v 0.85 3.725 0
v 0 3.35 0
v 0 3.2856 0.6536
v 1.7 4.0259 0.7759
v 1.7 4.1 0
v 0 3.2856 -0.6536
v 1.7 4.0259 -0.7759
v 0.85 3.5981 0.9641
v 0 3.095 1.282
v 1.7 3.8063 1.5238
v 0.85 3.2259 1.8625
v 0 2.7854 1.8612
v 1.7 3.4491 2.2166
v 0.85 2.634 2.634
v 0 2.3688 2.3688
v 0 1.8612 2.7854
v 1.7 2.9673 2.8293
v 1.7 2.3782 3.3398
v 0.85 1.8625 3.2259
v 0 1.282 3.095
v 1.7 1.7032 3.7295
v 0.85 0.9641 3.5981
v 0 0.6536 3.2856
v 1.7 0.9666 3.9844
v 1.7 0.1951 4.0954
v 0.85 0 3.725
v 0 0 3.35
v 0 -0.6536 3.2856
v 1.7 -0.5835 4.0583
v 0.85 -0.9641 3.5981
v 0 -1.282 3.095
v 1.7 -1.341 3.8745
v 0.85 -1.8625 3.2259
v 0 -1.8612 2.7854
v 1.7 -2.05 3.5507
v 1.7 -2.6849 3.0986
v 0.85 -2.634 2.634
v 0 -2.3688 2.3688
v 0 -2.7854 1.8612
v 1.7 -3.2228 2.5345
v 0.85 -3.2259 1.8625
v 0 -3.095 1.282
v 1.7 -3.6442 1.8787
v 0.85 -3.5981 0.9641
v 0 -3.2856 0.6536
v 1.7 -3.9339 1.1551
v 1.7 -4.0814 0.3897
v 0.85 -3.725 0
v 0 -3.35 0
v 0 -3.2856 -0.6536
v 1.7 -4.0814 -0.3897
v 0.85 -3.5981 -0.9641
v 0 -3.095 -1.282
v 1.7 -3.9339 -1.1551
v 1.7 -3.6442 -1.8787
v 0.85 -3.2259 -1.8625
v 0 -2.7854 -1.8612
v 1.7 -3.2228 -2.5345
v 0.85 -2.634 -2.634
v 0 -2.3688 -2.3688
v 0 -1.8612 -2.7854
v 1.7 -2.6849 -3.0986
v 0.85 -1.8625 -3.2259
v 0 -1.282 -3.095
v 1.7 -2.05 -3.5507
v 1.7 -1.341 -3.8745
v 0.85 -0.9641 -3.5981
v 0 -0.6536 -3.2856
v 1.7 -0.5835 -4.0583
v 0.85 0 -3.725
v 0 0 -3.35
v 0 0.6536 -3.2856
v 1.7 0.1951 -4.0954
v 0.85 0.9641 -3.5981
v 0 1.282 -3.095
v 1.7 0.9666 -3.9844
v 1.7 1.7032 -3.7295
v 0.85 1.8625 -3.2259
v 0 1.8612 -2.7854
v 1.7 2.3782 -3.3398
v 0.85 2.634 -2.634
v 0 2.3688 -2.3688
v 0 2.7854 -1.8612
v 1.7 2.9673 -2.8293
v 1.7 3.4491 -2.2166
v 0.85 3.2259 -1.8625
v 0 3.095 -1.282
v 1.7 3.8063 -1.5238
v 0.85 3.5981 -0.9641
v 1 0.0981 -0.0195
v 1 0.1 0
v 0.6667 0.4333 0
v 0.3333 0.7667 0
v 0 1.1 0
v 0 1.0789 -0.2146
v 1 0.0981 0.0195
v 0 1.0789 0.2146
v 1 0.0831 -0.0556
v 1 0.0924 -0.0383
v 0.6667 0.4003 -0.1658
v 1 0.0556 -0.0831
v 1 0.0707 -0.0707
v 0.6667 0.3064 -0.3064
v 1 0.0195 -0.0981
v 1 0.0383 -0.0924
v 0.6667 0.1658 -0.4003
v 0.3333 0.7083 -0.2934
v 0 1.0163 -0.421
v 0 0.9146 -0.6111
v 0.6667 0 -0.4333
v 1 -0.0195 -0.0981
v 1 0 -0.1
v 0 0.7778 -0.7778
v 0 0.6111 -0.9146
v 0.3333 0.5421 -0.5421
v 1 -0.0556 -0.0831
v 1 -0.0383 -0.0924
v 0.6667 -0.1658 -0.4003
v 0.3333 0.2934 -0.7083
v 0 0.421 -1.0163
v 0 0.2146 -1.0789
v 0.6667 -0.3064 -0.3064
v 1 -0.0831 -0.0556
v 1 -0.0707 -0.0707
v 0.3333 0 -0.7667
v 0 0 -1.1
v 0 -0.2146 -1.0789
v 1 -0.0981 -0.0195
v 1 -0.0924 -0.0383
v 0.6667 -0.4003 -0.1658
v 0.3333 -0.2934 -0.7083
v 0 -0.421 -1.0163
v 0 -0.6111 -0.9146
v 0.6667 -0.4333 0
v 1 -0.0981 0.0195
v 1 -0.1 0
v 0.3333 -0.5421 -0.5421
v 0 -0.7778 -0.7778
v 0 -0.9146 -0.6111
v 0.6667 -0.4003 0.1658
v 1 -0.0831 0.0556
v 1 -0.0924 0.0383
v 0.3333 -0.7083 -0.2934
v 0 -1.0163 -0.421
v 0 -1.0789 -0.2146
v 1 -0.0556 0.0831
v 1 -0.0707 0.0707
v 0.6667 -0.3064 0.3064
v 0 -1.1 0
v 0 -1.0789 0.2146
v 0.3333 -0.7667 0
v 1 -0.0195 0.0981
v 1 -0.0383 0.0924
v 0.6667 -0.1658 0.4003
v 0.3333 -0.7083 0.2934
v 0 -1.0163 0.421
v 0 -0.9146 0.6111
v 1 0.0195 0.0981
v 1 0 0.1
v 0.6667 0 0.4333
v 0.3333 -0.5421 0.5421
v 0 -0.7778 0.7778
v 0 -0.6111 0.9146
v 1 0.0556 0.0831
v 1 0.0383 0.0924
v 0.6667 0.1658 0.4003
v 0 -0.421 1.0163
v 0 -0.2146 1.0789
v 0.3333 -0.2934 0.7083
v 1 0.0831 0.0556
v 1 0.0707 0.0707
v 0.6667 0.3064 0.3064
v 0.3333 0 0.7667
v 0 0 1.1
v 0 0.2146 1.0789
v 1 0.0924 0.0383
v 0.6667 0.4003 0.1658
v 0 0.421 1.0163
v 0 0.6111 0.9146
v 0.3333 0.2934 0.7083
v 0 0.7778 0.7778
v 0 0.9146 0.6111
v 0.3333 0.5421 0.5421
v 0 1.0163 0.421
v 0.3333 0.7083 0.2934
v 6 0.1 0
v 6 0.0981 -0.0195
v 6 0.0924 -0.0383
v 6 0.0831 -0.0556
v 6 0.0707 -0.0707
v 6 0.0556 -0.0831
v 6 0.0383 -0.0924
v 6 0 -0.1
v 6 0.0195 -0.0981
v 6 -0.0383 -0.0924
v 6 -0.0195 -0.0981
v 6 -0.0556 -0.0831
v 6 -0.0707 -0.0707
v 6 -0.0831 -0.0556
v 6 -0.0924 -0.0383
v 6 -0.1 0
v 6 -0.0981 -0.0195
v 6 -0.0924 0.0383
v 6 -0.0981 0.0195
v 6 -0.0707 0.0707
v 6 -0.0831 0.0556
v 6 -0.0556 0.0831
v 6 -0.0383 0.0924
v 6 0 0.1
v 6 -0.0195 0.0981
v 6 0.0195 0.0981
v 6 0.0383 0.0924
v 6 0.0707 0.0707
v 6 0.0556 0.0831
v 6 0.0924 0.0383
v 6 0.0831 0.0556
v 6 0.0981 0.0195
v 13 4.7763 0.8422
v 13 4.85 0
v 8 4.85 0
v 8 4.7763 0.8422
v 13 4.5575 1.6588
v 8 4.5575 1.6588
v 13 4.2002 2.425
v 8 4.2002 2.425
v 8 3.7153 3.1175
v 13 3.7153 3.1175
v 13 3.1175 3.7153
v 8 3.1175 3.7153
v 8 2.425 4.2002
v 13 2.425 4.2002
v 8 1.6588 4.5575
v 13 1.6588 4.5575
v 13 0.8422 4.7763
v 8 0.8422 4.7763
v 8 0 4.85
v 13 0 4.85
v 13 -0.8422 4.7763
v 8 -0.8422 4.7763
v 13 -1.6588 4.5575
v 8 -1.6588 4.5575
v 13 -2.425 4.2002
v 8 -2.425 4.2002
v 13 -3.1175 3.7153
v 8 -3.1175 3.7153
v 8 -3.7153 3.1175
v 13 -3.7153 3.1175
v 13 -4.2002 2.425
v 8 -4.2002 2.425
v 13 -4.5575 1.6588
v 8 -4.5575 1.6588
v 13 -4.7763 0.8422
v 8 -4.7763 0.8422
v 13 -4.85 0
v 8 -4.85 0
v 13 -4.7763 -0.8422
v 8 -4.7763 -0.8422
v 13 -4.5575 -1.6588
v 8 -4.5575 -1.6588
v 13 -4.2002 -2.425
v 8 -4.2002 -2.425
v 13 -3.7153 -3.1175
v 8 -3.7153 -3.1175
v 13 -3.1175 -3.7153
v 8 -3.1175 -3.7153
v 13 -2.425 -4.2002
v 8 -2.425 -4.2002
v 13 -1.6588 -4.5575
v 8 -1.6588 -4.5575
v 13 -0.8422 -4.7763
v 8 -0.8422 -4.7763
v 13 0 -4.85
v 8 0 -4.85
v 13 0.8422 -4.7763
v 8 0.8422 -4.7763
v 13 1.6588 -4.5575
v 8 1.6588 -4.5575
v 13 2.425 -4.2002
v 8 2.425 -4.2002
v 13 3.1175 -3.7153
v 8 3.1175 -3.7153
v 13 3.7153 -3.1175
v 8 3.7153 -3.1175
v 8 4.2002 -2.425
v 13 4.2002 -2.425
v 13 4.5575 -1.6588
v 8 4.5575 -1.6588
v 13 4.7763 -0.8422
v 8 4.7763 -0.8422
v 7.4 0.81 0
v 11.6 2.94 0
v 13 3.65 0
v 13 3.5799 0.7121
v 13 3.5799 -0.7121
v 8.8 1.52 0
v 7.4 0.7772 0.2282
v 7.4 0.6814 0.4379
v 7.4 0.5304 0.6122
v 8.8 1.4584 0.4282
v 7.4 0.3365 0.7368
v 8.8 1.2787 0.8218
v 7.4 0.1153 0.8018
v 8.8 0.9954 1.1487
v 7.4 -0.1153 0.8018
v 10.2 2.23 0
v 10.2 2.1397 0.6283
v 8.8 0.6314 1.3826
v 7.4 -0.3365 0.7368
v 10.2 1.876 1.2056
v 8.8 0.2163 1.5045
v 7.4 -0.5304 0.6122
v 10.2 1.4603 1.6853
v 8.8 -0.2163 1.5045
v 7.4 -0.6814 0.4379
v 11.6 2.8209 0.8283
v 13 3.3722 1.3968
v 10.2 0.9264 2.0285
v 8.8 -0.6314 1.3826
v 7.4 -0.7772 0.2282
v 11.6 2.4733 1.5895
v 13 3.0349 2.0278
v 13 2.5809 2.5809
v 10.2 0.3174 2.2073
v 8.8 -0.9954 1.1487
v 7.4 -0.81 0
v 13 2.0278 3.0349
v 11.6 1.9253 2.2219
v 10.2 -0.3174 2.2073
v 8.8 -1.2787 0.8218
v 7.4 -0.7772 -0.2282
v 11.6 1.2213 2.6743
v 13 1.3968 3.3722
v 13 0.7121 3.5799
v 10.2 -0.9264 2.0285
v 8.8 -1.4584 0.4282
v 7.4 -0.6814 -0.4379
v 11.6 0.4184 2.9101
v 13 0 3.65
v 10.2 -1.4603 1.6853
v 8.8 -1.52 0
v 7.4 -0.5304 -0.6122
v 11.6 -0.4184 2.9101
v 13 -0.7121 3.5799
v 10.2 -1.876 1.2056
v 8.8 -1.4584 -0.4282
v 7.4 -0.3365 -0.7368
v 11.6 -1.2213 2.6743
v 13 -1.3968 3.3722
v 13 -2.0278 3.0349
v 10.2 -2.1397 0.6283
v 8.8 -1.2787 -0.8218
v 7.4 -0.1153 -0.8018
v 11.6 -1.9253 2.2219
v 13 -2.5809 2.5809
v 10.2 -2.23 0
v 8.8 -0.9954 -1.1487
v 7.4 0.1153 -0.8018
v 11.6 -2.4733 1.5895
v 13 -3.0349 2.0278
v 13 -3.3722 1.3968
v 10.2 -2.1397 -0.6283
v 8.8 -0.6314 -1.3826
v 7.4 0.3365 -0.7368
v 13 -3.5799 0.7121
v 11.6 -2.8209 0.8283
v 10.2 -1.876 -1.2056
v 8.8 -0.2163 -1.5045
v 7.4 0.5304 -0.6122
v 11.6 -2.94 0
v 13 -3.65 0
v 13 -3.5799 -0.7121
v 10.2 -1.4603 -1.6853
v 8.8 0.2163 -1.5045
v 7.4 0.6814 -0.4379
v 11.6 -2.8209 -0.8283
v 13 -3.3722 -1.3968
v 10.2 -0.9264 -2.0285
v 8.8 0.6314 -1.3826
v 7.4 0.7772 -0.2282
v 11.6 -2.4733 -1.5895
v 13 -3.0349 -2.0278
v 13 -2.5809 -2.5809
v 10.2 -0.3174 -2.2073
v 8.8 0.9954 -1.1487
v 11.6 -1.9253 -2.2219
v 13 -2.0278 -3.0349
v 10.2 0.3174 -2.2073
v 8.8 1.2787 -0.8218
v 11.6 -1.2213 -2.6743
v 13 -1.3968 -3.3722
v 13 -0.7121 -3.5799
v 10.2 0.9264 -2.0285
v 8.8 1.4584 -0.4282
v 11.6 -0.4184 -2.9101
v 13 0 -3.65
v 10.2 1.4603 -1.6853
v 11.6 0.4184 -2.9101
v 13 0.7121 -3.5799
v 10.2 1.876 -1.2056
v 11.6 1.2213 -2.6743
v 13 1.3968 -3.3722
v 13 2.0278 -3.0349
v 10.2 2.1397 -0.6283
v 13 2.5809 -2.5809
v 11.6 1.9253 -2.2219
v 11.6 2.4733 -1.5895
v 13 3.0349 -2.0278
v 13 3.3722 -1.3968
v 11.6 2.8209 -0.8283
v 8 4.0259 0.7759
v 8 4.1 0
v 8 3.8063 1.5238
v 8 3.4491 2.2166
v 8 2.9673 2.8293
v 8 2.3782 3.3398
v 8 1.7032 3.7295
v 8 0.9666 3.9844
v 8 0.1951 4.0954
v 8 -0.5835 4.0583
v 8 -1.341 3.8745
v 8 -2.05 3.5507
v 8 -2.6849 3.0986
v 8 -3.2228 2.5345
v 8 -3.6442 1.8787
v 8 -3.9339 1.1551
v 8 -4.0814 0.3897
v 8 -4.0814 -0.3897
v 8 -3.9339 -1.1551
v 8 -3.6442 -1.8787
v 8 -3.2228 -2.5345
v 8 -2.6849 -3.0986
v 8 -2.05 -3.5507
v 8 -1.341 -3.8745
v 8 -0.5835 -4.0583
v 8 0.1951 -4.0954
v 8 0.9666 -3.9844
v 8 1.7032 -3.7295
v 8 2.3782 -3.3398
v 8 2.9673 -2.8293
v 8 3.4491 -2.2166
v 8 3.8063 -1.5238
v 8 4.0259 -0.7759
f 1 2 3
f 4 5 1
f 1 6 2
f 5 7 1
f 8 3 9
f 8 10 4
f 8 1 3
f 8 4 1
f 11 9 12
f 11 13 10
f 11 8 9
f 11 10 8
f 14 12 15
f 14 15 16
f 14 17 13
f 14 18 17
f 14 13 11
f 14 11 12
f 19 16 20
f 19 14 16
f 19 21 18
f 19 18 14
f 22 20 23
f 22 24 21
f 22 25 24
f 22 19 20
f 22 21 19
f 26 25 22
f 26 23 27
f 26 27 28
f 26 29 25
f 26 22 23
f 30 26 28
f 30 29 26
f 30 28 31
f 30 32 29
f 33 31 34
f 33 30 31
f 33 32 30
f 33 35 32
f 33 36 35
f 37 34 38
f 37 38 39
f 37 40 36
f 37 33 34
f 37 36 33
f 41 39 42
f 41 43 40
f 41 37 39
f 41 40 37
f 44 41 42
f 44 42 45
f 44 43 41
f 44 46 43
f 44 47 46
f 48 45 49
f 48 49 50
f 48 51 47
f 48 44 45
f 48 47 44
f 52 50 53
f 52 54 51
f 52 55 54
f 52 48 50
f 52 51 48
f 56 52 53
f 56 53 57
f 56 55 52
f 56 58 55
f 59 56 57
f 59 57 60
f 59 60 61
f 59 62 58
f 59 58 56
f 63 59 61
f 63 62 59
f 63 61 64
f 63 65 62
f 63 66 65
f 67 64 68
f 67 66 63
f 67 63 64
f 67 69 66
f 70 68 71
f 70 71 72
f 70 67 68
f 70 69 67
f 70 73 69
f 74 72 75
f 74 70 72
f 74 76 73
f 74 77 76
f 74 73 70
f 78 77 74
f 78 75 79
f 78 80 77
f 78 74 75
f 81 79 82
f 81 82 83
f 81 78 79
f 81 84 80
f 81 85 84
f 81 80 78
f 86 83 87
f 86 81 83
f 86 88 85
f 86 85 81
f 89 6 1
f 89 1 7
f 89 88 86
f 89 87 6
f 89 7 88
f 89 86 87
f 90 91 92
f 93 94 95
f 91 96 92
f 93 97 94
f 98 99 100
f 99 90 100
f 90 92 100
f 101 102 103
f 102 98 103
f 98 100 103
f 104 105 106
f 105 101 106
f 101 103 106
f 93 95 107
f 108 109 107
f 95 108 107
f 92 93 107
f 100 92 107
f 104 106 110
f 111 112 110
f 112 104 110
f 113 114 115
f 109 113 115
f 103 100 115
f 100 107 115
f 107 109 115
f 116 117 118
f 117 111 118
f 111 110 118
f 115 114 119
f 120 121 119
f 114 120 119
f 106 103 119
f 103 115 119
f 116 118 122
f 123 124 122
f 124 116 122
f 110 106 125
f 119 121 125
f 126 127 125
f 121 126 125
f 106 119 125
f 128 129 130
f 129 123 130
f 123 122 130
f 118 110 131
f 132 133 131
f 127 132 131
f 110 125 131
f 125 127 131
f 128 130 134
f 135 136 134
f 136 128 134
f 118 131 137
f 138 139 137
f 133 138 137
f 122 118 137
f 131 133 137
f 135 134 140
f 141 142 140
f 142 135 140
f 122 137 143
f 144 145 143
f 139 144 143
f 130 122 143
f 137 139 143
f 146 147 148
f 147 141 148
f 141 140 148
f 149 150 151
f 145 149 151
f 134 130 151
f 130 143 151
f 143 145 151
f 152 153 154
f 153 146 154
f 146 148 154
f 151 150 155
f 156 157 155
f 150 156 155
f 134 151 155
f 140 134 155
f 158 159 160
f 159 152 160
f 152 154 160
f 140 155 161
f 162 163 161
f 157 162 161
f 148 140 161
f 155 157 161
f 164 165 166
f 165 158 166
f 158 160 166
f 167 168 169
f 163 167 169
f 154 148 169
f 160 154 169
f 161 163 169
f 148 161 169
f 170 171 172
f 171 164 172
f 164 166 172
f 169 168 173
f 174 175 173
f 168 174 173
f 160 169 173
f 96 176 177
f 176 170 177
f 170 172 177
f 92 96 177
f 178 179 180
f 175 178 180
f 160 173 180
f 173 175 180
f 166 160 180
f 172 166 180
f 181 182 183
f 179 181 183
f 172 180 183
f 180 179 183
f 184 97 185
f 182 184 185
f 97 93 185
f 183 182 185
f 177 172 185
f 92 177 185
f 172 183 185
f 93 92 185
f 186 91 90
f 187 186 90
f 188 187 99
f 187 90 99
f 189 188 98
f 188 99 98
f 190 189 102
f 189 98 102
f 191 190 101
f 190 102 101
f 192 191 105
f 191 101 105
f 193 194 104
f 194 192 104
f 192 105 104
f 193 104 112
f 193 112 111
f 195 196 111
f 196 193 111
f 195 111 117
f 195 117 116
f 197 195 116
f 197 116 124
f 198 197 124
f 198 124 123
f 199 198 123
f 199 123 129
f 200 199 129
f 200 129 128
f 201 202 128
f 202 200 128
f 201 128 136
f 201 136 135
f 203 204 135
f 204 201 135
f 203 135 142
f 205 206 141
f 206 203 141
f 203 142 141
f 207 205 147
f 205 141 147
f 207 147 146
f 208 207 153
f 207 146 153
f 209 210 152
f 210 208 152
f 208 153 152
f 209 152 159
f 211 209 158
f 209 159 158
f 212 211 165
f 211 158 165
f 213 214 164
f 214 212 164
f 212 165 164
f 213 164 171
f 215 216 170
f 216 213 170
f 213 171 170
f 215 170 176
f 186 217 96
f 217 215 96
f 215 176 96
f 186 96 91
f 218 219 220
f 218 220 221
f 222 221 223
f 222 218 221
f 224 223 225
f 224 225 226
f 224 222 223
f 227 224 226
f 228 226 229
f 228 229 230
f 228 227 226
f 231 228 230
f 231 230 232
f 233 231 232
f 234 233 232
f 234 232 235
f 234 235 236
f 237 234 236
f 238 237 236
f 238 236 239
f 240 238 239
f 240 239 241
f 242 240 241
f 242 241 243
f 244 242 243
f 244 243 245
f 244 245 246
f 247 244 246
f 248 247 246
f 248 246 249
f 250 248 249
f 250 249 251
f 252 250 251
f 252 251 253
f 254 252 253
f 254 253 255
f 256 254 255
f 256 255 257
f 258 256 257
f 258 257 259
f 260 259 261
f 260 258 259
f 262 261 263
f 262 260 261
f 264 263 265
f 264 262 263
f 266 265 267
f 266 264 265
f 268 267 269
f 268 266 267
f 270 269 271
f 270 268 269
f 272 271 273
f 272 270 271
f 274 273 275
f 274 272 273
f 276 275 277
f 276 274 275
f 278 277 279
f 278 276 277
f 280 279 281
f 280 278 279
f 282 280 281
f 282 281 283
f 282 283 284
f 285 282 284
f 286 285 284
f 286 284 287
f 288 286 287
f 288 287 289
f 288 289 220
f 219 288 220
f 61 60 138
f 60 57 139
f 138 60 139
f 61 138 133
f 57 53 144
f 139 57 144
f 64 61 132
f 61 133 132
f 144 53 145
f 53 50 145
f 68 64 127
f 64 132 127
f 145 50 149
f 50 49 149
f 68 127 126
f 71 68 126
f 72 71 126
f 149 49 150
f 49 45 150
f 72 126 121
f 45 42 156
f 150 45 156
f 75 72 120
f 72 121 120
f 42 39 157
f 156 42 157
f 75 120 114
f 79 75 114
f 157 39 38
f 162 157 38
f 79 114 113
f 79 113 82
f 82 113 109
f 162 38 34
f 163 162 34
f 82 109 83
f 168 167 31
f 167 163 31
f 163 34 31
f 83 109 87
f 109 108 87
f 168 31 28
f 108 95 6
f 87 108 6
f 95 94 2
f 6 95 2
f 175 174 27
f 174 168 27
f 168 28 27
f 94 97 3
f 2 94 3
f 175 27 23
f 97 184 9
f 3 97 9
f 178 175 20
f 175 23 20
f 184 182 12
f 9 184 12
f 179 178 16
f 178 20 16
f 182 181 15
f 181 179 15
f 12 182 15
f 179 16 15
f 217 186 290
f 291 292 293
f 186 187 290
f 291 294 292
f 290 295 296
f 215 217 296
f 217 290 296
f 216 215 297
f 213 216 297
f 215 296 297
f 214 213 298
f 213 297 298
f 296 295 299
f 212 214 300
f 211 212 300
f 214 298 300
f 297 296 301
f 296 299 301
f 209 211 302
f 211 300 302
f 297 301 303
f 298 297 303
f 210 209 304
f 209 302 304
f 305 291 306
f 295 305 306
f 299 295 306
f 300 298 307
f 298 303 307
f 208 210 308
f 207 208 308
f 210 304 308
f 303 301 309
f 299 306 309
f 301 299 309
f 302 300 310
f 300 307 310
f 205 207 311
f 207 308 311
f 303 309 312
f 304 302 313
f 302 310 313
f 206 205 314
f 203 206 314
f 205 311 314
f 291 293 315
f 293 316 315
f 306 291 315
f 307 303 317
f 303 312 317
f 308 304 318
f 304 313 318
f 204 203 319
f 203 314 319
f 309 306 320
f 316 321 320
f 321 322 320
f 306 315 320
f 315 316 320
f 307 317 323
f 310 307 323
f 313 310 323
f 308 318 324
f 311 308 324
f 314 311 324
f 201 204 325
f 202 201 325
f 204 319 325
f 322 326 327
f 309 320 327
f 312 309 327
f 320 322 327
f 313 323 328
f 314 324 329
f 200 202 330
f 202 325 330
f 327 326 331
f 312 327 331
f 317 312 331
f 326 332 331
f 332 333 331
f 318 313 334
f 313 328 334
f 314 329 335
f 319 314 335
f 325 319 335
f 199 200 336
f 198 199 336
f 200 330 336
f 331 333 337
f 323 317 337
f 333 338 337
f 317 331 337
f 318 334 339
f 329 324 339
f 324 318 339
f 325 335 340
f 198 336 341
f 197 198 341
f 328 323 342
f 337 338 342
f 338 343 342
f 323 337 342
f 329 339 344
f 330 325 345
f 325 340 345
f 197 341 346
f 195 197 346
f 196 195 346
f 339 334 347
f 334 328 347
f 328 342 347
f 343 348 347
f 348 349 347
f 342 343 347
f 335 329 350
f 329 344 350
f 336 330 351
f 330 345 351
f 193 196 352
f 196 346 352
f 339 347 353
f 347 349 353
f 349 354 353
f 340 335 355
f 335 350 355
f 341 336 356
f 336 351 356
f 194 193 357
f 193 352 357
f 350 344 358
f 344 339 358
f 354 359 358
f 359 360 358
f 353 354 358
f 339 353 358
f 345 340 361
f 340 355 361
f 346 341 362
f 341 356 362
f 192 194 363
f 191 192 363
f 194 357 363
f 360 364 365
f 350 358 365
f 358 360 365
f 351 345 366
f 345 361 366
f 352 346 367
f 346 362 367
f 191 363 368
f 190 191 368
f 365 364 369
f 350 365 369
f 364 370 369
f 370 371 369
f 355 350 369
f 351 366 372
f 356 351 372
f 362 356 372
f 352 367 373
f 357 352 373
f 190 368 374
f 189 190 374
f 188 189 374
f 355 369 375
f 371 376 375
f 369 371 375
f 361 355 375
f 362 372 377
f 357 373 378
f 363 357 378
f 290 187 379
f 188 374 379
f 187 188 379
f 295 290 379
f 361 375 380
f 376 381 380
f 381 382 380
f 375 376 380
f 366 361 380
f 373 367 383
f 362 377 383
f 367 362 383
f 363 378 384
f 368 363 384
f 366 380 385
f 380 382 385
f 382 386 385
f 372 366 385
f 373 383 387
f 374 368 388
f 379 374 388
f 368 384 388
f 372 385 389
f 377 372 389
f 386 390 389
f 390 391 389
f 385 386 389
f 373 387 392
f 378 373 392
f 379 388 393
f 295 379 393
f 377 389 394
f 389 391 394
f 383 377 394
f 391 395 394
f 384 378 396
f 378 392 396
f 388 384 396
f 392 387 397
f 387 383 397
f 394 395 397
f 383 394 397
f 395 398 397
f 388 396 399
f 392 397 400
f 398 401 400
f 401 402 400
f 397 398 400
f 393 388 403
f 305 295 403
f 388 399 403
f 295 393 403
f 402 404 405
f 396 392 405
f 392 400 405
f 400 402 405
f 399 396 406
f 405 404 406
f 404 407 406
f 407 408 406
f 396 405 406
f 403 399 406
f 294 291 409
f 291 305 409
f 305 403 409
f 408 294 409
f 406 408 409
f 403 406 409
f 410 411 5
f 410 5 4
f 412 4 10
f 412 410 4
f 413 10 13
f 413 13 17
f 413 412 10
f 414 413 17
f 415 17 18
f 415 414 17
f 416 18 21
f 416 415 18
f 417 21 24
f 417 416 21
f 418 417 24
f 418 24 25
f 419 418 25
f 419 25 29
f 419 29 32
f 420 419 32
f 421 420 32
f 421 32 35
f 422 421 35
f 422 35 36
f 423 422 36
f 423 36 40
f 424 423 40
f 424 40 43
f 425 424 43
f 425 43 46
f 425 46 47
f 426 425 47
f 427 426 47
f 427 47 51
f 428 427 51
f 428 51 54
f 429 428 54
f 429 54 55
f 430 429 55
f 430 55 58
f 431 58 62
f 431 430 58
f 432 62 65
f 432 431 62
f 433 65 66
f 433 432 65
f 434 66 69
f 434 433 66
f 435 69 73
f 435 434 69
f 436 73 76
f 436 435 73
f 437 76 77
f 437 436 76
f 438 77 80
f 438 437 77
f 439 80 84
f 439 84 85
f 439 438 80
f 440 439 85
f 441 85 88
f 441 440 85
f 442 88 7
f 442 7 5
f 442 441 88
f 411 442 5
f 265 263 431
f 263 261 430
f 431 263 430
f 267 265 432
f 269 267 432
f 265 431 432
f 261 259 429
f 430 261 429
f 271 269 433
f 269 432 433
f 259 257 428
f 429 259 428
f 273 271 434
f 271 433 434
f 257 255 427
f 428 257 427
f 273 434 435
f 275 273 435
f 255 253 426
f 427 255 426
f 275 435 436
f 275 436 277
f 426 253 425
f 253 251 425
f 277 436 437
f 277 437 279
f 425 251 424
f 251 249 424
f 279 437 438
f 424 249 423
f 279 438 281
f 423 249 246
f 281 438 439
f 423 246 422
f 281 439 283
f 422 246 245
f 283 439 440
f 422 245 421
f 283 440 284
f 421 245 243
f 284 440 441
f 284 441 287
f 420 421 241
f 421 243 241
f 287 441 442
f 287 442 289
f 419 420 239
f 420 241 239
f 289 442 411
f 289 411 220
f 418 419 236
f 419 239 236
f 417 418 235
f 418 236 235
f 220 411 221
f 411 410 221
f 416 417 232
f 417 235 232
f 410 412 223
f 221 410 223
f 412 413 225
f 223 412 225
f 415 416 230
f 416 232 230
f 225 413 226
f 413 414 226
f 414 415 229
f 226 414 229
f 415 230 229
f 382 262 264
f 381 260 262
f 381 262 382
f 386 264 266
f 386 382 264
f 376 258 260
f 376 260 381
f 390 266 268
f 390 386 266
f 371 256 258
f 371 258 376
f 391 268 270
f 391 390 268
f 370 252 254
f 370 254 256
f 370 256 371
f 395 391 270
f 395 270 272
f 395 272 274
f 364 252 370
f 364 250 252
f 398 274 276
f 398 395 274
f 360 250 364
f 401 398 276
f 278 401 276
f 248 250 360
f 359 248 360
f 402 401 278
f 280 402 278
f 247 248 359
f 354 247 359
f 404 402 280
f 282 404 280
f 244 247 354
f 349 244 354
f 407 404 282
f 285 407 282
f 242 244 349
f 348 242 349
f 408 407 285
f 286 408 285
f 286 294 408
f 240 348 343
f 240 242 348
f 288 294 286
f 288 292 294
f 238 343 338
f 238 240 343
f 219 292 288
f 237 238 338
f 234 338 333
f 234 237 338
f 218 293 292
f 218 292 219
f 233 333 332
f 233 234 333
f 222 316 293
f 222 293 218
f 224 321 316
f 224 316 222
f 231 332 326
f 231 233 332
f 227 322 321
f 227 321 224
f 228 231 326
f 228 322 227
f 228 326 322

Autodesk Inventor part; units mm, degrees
ref_plane "YZ Plane" through (0, 0, 0) normal (1, 0, 0) x (0, 1, 0)
ref_plane "XZ Plane" through (0, 0, 0) normal (0, 1, 0) x (-1, 0, 0)
ref_plane "XY Plane" through (0, 0, 0) normal (0, 0, 1) x (1, 0, 0)
sketch "Эскиз1" plane through (0, 0, 0) normal (0, 0, 1) x (1, 0, 0)
  line L0 (1, 0.1) -> (0, 1.1)
  line L1 (0, 1.1) -> (0, 3.35)
  line L2 (0, 3.35) -> (1.7, 4.1)
  line L3 (1.7, 4.1) -> (8, 4.1)
  line L4 (8, 4.1) -> (8, 4.85)
  line L5 (8, 4.85) -> (13, 4.85)
  line L6 (13, 4.85) -> (13, 3.65)
  line L7 (13, 3.65) -> (6, 0.1)
  line L8 (6, 0.1) -> (1, 0.1)
  line L9 (-2.6, 0) -> (15.6, 0) construction
  line L10 (0, -0.97) -> (0, 5.82) construction
  point P0 (0, 0)
  point P1 (0, -0.97)
  dimension "d1" = 0.1
  dimension "d2" = 4.1
  dimension "d3" = 1.7
  dimension "d5" = 3.35
  dimension "d6" = 1
  dimension "d7" = 135
  dimension "d8" = 5
  dimension "d9" = 13
  dimension "d10" = 4.85
  dimension "d11" = 5
  dimension "d12" = 1.2
revolve "Вращение1" add sketch "Эскиз1" angle 360 about axis through (-10, 0, 0) along (1, 0, 0)
properties part number "Сопло фильеры"
